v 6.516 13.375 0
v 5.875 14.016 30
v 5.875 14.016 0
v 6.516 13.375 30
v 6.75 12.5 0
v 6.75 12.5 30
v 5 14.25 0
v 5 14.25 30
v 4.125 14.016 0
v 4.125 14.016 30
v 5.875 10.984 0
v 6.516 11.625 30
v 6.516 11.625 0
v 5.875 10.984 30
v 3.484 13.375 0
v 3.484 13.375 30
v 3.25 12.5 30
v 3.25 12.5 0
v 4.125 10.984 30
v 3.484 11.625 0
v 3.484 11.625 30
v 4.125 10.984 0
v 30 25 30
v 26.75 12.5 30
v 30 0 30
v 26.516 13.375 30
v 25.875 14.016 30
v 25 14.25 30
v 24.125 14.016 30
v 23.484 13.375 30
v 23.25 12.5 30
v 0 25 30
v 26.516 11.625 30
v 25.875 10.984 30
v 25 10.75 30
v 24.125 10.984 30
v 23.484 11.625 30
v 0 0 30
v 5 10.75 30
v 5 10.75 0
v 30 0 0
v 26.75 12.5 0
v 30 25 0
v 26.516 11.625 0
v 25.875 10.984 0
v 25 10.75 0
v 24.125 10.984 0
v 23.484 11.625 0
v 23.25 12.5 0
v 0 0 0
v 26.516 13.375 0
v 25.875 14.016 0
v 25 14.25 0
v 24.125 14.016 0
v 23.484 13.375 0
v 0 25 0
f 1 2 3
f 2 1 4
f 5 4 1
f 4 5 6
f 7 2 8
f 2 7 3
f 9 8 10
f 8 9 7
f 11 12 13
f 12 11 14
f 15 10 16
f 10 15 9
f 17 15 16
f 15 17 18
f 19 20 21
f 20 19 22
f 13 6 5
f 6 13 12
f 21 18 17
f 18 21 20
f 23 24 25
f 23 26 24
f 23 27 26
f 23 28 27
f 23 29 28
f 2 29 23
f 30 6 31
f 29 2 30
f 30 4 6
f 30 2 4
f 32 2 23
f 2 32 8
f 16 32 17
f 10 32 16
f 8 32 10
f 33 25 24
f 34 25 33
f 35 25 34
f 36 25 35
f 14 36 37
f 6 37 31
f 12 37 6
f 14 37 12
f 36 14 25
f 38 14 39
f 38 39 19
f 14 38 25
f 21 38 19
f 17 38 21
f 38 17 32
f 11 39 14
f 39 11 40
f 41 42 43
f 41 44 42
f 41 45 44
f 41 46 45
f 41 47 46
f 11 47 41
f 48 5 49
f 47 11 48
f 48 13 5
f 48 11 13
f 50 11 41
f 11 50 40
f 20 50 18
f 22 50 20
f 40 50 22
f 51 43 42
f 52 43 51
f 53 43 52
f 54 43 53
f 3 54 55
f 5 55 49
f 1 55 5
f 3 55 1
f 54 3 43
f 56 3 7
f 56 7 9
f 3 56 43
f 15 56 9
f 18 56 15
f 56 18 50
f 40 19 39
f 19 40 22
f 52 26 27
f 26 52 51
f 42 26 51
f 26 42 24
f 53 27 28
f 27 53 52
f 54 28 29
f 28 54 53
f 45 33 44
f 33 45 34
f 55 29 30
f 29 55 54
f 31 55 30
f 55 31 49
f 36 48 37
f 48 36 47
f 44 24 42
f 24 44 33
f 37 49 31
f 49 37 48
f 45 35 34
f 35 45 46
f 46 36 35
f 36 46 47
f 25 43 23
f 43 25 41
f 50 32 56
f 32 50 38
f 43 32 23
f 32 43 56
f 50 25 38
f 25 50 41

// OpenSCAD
ht=30;

difference()
{
    
    cube([30,25,ht]);
    
    union()
    {
        translate([5,25/2,0])
            cylinder(d=3.5,h=ht,$fn=12);
        translate([30-5,25/2,0])
            cylinder(d=3.5,h=ht,$fn=12);
        
        //translate([9,3,0])
        //    cube([30-9*2,25-3*2,ht]);
        /*translate([3,3,0])
            cube([30-3*2,5,ht]);
        translate([3,25-5-3,0])
            cube([30-3*2,5,ht]);*/
    }
}
